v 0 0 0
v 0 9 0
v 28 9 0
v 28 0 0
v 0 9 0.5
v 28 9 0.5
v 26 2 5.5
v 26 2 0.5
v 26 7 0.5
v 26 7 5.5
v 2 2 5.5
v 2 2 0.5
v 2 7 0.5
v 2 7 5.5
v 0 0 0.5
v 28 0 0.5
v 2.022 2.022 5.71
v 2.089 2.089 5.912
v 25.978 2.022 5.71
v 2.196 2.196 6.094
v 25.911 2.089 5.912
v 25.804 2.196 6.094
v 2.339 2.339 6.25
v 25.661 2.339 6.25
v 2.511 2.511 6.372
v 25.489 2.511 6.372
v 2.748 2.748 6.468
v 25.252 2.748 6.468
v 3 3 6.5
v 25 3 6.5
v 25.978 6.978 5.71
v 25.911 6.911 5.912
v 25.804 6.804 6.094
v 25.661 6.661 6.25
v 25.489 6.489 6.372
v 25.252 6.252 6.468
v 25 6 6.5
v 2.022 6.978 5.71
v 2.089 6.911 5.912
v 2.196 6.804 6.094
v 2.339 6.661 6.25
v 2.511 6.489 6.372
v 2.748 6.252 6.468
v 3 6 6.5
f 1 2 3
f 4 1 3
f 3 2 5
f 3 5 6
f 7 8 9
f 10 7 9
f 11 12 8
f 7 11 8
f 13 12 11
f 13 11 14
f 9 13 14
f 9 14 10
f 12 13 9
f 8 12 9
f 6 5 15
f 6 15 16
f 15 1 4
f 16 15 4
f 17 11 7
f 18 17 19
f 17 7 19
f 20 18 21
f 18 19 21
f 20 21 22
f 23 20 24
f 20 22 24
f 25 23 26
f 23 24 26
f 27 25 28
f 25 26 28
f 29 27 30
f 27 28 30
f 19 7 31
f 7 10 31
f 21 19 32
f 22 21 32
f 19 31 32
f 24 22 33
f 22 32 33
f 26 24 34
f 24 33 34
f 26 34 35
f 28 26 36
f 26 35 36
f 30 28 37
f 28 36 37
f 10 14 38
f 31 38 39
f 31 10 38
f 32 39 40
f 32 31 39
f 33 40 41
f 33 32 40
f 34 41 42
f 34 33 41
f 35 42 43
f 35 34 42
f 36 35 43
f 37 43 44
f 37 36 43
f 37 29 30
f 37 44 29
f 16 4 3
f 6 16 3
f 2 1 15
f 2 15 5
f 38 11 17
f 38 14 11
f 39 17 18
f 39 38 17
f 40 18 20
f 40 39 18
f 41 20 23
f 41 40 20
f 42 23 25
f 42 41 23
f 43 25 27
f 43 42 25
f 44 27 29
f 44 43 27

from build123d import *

# Parameters (mm, degrees)
SKETCH_W     = 28
SKETCH_H     = 9
PAD_DEPTH    = 0.5
SKETCH001_W  = 24
SKETCH001_H  = 5
PAD001_DEPTH = 6
FILLET_R     = 1


with BuildPart() as pad:
    # Sketch → Pad (new body)
    with BuildSketch(Plane.XY):
        with Locations((14, 4.5)):
            Rectangle(SKETCH_W, SKETCH_H)
    extrude(amount=PAD_DEPTH)


with BuildPart() as fillet_body:
    # Sketch001 → Pad001 (new body)
    with BuildSketch(Plane.XY.offset(0.5)):
        with Locations((14, 4.5)):
            Rectangle(SKETCH001_W, SKETCH001_H)
    extrude(amount=PAD001_DEPTH)

    # Fillet
    fillet_edges = [fillet_body.edges().sort_by_distance(p)[0] for p in [
        (14, 2, 6.5),
        (26, 4.5, 6.5),
        (14, 7, 6.5),
        (2, 4.5, 6.5),
    ]]
    fillet(fillet_edges, radius=FILLET_R)


solid = Compound([pad.part, fillet_body.part])
